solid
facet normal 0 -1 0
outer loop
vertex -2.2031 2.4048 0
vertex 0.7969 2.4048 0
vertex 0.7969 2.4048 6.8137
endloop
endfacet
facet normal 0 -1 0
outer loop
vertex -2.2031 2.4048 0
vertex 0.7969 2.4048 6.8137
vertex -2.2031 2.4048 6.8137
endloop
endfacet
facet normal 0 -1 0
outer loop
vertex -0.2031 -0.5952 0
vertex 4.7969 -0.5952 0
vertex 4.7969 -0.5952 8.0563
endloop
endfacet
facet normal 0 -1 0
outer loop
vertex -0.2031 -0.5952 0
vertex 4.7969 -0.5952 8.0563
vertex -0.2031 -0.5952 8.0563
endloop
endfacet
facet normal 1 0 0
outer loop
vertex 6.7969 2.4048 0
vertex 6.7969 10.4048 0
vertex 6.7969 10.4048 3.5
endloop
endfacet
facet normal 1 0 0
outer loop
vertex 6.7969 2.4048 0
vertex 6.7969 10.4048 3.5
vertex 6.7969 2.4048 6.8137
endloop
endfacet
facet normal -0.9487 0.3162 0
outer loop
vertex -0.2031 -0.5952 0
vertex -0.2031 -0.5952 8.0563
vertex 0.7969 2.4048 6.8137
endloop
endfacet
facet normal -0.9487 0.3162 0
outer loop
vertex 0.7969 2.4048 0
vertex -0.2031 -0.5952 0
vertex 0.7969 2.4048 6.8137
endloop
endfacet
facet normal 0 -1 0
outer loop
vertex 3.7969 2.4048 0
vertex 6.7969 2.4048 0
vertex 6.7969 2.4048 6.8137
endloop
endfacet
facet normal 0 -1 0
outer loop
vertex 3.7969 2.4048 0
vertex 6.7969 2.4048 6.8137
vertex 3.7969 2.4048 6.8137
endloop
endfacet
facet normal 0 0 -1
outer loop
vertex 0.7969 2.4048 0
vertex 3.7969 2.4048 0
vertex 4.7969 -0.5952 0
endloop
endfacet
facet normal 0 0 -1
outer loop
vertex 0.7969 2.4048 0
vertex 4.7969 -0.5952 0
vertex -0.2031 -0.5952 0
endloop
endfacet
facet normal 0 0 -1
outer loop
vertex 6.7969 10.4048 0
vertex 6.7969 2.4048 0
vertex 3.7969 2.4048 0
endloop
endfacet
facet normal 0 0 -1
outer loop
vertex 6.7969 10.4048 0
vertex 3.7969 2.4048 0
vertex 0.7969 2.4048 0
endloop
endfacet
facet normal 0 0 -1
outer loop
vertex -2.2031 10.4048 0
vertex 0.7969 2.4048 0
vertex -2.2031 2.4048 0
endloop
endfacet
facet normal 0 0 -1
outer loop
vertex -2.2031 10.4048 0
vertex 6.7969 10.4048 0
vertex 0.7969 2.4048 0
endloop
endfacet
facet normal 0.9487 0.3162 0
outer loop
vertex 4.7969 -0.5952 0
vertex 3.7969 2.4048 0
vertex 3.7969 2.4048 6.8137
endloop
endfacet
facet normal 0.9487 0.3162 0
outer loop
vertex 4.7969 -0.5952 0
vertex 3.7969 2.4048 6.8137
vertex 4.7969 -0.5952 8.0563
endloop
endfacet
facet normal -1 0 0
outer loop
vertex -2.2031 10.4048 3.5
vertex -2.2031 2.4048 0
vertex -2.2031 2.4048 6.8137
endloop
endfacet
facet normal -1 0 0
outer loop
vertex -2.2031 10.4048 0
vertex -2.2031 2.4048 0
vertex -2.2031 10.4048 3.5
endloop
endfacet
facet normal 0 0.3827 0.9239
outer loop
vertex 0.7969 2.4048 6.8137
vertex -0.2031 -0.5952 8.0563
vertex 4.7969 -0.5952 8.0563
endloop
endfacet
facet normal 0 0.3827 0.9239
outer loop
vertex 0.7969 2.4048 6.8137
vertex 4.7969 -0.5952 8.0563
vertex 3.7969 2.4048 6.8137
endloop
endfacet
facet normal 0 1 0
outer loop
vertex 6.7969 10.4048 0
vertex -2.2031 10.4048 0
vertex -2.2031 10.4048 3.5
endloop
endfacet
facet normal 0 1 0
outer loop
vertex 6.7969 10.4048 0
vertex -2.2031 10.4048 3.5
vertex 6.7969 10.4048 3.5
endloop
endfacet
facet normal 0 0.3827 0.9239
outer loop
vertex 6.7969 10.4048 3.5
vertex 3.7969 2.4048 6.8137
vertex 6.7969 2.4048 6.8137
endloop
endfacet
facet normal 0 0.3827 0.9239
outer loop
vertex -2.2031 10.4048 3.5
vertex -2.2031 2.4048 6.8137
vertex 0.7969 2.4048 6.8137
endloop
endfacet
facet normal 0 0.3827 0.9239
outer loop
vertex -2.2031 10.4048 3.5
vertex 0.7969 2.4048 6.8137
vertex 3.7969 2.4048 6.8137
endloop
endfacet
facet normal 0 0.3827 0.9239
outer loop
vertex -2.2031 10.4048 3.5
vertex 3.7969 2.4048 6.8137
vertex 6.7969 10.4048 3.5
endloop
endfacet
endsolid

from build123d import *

# Parameters (mm, degrees)
BOSS_EXTRUDE1_DEPTH     = 10
CUT_EXTRUDE1_DEPTH      = 18.007618008
CUT_EXTRUDE1_DEPTH_BACK = 18.007618008


with BuildPart() as part:
    # Sketch2 → Boss-Extrude1 (new body)
    with BuildSketch(Plane.XY):
        Polygon((0.796949894, 2.404761905), (-2.203050106, 2.404761905), (-2.203050106, 10.404761905), (6.796949894, 10.404761905), (6.796949894, 2.404761905), (3.796949894, 2.404761905), (4.796949894, -0.595238095), (-0.203050106, -0.595238095), align=None)
    extrude(amount=BOSS_EXTRUDE1_DEPTH)

    # Sketch3 → Cut-Extrude1 (cut, two sides: drawn at the far end of the back side and taken through both)
    with BuildSketch(Plane(origin=(6.796949894, 0, 0), x_dir=(0, 0, -1), z_dir=(1, 0, 0)).offset(-CUT_EXTRUDE1_DEPTH_BACK)):
        Polygon((-3.5, 10.404761905), (-10, 10.404761905), (-10, 2.404761905), (-6.813708499, 2.404761905), align=None)
        Polygon((-6.813708499, 2.404761905), (-10, 2.404761905), (-10, -0.595238095), (-8.056349186, -0.595238095), align=None)
    extrude(amount=CUT_EXTRUDE1_DEPTH + CUT_EXTRUDE1_DEPTH_BACK, mode=Mode.SUBTRACT)


solid = part.part
